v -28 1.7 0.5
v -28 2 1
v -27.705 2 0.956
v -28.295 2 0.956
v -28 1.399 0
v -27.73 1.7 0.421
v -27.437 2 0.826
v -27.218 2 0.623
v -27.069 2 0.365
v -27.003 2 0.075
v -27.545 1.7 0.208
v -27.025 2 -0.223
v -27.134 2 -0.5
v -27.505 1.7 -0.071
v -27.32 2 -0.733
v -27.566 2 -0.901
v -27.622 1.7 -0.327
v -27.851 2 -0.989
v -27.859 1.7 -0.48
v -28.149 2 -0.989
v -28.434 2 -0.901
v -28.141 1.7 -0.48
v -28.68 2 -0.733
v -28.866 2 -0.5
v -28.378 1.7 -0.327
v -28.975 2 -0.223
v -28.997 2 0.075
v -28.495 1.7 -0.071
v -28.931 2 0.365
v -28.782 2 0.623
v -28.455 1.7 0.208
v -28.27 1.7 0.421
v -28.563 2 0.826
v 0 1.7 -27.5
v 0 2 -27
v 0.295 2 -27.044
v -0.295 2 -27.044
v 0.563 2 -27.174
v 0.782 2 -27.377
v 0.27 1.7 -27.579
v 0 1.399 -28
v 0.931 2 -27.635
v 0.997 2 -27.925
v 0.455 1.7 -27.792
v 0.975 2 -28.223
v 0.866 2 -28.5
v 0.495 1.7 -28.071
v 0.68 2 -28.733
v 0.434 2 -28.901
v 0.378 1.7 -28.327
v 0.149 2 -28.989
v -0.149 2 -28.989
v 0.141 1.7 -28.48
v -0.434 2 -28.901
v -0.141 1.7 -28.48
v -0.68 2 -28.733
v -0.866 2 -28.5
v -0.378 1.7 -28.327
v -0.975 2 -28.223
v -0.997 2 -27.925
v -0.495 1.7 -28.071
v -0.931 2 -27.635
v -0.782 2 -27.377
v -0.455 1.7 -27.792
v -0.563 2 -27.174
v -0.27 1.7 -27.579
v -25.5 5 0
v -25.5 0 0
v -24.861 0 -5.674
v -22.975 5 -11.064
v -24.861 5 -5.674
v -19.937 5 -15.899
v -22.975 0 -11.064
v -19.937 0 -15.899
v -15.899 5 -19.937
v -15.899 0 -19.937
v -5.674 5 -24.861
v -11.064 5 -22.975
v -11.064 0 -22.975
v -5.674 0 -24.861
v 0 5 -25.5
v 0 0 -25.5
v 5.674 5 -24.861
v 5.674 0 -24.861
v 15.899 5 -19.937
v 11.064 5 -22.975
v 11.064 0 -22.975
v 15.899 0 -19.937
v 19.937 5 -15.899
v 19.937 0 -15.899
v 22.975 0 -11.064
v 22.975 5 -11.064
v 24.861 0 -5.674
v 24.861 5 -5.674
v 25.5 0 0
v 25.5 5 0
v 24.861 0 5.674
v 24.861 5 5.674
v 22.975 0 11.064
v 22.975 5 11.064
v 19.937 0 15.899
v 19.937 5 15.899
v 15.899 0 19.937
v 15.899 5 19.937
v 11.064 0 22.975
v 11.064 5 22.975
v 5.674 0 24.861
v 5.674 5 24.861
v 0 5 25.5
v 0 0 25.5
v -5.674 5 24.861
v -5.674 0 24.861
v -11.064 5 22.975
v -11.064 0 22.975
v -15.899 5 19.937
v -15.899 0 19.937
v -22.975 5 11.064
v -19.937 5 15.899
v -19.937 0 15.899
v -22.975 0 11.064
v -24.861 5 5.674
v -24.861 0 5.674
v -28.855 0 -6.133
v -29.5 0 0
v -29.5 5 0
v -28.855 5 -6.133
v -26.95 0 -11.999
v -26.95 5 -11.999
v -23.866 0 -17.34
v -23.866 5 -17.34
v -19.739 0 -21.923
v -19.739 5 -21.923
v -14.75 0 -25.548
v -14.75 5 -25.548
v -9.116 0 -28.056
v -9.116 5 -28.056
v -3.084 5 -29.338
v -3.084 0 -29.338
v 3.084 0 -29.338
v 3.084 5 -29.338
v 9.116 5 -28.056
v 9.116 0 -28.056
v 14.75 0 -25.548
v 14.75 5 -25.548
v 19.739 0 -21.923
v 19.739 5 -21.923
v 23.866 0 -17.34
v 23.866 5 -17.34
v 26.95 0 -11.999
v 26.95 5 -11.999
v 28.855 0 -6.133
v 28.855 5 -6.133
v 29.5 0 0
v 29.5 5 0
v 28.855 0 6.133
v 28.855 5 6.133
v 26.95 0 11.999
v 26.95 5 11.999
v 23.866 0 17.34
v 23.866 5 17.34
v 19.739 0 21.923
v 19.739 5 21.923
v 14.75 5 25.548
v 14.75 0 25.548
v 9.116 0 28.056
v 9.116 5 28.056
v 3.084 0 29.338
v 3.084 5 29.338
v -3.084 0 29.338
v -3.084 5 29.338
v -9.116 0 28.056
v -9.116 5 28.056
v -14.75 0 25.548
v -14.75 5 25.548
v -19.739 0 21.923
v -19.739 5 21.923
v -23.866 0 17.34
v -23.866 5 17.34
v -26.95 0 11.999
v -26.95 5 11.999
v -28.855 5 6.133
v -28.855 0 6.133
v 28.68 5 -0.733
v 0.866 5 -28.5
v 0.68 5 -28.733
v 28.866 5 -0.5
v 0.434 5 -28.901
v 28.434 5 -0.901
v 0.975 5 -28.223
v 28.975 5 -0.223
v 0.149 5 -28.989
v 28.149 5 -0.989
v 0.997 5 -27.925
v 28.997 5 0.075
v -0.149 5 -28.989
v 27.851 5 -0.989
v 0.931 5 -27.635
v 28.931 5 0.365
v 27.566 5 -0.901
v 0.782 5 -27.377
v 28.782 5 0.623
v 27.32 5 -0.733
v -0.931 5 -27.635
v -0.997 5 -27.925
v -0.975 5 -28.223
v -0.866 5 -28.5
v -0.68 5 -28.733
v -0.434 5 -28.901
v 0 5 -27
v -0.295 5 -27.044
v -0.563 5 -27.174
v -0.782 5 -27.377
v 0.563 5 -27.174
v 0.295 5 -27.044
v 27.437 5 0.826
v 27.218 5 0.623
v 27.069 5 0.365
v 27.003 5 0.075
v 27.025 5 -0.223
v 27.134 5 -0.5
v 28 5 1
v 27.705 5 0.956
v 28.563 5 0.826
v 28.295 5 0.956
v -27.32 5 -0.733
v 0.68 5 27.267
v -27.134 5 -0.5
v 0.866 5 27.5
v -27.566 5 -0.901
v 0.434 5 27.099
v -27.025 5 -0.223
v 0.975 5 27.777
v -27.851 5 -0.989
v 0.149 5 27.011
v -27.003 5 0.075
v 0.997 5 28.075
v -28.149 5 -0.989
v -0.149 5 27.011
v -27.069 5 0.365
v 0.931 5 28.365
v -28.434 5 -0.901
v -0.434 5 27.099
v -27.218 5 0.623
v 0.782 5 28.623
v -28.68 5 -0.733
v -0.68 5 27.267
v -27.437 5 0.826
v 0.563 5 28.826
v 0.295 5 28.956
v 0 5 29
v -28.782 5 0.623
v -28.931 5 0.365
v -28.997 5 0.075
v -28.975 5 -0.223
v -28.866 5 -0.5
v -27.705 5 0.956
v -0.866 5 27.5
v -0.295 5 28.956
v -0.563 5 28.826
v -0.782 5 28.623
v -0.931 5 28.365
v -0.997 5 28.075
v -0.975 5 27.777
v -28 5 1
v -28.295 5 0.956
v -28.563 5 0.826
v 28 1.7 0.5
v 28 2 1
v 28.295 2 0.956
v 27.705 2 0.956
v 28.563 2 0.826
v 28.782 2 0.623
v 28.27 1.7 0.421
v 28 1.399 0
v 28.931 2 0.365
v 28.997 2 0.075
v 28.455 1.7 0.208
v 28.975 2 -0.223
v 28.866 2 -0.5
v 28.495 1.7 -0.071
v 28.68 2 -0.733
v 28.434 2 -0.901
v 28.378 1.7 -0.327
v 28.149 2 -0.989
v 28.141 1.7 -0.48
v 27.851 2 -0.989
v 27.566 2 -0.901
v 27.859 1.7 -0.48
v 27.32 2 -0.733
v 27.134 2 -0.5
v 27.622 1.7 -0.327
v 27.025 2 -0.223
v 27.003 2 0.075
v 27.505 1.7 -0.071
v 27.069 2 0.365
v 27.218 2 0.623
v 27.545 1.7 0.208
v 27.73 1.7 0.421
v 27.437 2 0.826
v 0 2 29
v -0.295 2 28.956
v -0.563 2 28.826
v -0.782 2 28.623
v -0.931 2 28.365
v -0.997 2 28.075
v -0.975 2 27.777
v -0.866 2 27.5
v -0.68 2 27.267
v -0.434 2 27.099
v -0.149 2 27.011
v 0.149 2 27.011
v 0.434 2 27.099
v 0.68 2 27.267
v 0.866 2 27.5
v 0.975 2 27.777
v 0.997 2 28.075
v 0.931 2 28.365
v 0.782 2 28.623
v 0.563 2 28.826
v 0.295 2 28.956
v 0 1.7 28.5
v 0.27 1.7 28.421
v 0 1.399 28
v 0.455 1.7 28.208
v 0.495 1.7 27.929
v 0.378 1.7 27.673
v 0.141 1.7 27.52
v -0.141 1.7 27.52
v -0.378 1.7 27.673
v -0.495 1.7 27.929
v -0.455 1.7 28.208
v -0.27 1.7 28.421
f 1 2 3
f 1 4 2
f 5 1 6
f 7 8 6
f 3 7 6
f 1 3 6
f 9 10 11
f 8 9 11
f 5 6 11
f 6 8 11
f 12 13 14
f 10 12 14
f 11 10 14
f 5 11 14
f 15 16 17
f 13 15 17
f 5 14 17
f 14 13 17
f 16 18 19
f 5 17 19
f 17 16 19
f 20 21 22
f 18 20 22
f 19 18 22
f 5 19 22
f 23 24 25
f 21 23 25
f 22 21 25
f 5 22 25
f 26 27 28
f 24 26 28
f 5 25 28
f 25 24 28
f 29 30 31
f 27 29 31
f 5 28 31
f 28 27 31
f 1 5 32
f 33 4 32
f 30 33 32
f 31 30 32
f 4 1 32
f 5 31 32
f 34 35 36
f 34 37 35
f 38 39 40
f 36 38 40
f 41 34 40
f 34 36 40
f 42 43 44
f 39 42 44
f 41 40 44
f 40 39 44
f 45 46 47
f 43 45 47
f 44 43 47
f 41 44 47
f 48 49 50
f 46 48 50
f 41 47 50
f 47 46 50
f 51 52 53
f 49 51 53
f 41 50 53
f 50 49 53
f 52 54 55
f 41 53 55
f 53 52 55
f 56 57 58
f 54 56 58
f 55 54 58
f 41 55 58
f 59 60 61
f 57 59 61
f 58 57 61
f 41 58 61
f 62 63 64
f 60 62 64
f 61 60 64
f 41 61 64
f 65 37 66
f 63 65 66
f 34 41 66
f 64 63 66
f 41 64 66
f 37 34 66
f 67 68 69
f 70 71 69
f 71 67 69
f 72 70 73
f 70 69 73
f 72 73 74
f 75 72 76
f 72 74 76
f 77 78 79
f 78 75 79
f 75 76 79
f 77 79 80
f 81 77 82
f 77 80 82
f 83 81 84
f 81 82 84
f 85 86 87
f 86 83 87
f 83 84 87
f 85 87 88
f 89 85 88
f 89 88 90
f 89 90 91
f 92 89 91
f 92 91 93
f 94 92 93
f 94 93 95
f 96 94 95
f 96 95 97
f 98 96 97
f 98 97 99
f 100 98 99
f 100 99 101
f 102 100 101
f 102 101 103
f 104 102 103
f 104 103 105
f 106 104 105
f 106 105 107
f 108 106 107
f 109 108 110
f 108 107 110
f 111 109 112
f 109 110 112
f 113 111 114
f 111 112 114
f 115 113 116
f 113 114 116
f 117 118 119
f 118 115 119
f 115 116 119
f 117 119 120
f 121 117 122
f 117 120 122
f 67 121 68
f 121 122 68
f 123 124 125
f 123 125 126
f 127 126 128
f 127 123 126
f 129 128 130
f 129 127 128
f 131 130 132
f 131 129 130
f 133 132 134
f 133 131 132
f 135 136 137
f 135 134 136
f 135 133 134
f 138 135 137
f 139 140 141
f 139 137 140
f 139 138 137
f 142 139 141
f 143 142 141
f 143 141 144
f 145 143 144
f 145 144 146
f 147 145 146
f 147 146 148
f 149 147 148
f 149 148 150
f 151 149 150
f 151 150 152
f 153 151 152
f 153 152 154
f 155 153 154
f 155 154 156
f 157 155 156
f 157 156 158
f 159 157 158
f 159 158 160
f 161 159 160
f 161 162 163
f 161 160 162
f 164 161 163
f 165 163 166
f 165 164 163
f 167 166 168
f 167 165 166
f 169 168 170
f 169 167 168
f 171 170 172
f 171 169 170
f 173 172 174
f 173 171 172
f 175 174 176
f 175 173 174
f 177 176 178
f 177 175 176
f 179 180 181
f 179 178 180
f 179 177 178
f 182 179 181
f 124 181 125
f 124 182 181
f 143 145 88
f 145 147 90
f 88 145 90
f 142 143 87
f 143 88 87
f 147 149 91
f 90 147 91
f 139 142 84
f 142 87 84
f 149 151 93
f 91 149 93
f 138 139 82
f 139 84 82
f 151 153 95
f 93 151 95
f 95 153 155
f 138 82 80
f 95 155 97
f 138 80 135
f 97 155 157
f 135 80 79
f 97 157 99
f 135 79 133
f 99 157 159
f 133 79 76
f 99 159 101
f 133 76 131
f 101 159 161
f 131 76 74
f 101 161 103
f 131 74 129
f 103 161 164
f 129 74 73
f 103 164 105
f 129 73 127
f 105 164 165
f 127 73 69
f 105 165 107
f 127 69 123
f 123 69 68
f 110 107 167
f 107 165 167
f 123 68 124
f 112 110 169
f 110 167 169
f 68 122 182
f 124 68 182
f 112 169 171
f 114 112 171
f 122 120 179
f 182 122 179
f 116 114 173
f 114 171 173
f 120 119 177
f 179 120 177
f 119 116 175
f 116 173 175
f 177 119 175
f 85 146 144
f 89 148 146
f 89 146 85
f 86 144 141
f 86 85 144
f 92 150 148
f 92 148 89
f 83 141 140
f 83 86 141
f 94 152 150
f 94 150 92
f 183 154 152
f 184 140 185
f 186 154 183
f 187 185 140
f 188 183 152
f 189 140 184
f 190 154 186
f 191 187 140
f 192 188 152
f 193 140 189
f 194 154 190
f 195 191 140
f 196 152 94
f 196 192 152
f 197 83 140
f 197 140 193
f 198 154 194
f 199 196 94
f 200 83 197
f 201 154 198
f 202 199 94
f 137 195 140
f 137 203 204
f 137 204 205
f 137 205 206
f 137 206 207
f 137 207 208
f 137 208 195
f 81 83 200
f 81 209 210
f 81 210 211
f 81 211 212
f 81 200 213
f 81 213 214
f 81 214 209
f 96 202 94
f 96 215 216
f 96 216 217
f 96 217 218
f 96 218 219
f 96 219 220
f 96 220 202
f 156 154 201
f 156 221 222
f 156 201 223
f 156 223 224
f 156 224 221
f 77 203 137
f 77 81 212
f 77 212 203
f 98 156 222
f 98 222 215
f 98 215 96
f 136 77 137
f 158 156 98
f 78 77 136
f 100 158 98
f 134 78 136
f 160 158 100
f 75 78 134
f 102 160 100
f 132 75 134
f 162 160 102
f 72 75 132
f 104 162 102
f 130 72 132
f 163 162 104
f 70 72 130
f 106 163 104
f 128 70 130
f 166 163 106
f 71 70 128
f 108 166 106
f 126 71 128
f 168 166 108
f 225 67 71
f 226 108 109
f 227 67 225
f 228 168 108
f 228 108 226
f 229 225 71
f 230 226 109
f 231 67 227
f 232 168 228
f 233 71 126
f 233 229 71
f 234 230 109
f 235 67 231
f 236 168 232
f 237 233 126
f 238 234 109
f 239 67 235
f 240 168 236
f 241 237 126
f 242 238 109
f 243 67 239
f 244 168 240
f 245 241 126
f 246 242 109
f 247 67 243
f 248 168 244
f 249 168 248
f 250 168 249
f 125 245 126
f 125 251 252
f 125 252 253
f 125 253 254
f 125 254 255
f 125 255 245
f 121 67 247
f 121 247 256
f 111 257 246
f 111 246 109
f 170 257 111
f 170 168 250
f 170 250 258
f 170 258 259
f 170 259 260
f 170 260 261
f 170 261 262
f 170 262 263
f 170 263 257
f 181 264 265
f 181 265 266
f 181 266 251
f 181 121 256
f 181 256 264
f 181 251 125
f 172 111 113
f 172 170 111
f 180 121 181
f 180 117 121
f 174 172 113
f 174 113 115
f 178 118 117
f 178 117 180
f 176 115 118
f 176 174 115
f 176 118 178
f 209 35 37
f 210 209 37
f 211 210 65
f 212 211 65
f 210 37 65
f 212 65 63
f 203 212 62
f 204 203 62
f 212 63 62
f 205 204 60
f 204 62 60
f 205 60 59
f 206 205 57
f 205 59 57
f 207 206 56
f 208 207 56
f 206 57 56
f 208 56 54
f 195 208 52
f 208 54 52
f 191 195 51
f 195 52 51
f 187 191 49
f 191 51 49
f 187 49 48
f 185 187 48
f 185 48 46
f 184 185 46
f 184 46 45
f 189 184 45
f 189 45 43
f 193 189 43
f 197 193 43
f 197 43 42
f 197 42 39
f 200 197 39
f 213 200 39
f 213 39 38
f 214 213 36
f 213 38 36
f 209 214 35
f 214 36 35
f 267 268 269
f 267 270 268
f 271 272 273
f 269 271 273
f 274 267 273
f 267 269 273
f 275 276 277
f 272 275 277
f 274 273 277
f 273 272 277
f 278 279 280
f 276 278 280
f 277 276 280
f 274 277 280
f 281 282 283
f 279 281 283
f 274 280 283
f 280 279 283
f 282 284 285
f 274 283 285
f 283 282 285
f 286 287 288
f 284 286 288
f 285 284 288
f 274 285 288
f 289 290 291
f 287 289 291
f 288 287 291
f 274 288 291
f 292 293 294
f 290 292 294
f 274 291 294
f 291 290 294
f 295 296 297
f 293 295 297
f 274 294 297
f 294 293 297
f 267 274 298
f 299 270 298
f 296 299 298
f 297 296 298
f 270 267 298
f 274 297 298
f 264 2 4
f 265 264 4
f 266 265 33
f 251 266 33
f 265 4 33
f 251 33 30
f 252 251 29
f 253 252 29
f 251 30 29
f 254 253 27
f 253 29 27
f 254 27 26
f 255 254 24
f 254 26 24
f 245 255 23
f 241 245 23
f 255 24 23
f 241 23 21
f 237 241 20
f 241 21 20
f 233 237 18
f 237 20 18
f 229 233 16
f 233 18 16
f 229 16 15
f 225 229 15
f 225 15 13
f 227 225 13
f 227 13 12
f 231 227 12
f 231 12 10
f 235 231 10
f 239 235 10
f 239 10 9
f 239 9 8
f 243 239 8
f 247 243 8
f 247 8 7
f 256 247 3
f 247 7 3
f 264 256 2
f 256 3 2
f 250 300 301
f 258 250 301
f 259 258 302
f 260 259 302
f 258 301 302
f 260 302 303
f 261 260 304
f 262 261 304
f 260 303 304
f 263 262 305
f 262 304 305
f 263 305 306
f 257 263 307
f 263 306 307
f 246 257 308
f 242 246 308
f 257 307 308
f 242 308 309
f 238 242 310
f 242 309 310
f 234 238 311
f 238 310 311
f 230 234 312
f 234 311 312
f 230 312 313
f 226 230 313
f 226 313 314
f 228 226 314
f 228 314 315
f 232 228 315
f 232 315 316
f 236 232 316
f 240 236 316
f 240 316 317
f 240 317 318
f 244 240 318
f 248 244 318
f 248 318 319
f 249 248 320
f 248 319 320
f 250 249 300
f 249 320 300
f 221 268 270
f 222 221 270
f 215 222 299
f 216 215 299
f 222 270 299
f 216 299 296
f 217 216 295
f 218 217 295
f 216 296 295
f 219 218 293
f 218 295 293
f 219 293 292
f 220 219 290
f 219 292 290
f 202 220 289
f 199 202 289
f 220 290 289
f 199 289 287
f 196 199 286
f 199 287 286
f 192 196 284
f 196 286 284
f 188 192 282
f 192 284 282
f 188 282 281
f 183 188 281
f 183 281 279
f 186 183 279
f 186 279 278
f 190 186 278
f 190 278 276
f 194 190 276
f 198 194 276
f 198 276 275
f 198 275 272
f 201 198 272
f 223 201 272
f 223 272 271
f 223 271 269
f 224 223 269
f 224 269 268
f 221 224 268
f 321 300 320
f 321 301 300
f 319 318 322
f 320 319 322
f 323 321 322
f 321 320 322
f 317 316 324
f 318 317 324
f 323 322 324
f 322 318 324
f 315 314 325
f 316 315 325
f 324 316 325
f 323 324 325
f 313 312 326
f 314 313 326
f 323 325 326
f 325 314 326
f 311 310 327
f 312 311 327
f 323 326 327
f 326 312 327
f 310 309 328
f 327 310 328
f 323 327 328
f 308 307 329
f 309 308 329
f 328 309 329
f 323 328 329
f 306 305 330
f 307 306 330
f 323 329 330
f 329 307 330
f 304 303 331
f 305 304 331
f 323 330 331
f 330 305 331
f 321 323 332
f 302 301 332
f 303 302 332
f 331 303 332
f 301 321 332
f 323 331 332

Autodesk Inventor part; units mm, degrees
ref_plane "YZ Plane" through (0, 0, 0) normal (1, 0, 0) x (0, 1, 0)
ref_plane "XZ Plane" through (0, 0, 0) normal (0, 1, 0) x (-1, 0, 0)
ref_plane "XY Plane" through (0, 0, 0) normal (0, 0, 1) x (1, 0, 0)
sketch "Sketch1" plane through (0, 0, 0) normal (0, 1, 0) x (-1, 0, 0)
  circle A0 centre (0, 0) radius 25.5
  circle A1 centre (0, 0) radius 29.5
  dimension "d0" = 51
  dimension "d1" = 59
extrude "Extrusion1" add sketch "Sketch1" along normal blind 5
sketch "Sketch2" plane through (0, 5, 0) normal (0, 1, 0) x (1, 0, 0)
  circle A0 centre (0, -28) radius 1
  point P0 (0, 0)
  dimension "d4" = 2
  dimension "d5" = 28
sketch "Sketch3" plane through (0, 5, 0) normal (0, 1, 0) x (1, 0, 0)
  circle A0 centre (-28, 0) radius 1
  point P0 (0, 0)
  dimension "d6" = 2
  dimension "d7" = 28
sketch "Sketch4" plane through (0, 5, 0) normal (0, 1, 0) x (1, 0, 0)
  circle A0 centre (0, 28) radius 1
  point P0 (0, 0)
  dimension "d8" = 2
  dimension "d9" = 28
sketch "Sketch5" plane through (0, 5, 0) normal (0, 1, 0) x (1, 0, 0)
  circle A0 centre (28, 0) radius 1
  point P0 (0, 0)
  dimension "d10" = 2
  dimension "d11" = 28
hole "Hole1" at (0, 5, 28) direction (0, -1, 0) diameter 2 depth 3 tip angle 118
hole "Hole2" at (-28, 5, 0) direction (0, -1, 0) diameter 2 depth 3 tip angle 118
hole "Hole3" at (0, 5, -28) direction (0, -1, 0) diameter 2 depth 3 tip angle 118
hole "Hole4" at (28, 5, 0) direction (0, -1, 0) diameter 2 depth 3 tip angle 118
thread "Thread1" size "M2x0.4" class "6H" standard "ANSI Metric M Profile" full length
thread "Thread2" size "M2x0.4" class "6H" standard "ANSI Metric M Profile" full length
thread "Thread3" size "M2x0.4" class "6H" standard "ANSI Metric M Profile" full length
thread "Thread4" size "M2x0.4" class "6H" standard "ANSI Metric M Profile" full length
properties part number "PMT Cap"
